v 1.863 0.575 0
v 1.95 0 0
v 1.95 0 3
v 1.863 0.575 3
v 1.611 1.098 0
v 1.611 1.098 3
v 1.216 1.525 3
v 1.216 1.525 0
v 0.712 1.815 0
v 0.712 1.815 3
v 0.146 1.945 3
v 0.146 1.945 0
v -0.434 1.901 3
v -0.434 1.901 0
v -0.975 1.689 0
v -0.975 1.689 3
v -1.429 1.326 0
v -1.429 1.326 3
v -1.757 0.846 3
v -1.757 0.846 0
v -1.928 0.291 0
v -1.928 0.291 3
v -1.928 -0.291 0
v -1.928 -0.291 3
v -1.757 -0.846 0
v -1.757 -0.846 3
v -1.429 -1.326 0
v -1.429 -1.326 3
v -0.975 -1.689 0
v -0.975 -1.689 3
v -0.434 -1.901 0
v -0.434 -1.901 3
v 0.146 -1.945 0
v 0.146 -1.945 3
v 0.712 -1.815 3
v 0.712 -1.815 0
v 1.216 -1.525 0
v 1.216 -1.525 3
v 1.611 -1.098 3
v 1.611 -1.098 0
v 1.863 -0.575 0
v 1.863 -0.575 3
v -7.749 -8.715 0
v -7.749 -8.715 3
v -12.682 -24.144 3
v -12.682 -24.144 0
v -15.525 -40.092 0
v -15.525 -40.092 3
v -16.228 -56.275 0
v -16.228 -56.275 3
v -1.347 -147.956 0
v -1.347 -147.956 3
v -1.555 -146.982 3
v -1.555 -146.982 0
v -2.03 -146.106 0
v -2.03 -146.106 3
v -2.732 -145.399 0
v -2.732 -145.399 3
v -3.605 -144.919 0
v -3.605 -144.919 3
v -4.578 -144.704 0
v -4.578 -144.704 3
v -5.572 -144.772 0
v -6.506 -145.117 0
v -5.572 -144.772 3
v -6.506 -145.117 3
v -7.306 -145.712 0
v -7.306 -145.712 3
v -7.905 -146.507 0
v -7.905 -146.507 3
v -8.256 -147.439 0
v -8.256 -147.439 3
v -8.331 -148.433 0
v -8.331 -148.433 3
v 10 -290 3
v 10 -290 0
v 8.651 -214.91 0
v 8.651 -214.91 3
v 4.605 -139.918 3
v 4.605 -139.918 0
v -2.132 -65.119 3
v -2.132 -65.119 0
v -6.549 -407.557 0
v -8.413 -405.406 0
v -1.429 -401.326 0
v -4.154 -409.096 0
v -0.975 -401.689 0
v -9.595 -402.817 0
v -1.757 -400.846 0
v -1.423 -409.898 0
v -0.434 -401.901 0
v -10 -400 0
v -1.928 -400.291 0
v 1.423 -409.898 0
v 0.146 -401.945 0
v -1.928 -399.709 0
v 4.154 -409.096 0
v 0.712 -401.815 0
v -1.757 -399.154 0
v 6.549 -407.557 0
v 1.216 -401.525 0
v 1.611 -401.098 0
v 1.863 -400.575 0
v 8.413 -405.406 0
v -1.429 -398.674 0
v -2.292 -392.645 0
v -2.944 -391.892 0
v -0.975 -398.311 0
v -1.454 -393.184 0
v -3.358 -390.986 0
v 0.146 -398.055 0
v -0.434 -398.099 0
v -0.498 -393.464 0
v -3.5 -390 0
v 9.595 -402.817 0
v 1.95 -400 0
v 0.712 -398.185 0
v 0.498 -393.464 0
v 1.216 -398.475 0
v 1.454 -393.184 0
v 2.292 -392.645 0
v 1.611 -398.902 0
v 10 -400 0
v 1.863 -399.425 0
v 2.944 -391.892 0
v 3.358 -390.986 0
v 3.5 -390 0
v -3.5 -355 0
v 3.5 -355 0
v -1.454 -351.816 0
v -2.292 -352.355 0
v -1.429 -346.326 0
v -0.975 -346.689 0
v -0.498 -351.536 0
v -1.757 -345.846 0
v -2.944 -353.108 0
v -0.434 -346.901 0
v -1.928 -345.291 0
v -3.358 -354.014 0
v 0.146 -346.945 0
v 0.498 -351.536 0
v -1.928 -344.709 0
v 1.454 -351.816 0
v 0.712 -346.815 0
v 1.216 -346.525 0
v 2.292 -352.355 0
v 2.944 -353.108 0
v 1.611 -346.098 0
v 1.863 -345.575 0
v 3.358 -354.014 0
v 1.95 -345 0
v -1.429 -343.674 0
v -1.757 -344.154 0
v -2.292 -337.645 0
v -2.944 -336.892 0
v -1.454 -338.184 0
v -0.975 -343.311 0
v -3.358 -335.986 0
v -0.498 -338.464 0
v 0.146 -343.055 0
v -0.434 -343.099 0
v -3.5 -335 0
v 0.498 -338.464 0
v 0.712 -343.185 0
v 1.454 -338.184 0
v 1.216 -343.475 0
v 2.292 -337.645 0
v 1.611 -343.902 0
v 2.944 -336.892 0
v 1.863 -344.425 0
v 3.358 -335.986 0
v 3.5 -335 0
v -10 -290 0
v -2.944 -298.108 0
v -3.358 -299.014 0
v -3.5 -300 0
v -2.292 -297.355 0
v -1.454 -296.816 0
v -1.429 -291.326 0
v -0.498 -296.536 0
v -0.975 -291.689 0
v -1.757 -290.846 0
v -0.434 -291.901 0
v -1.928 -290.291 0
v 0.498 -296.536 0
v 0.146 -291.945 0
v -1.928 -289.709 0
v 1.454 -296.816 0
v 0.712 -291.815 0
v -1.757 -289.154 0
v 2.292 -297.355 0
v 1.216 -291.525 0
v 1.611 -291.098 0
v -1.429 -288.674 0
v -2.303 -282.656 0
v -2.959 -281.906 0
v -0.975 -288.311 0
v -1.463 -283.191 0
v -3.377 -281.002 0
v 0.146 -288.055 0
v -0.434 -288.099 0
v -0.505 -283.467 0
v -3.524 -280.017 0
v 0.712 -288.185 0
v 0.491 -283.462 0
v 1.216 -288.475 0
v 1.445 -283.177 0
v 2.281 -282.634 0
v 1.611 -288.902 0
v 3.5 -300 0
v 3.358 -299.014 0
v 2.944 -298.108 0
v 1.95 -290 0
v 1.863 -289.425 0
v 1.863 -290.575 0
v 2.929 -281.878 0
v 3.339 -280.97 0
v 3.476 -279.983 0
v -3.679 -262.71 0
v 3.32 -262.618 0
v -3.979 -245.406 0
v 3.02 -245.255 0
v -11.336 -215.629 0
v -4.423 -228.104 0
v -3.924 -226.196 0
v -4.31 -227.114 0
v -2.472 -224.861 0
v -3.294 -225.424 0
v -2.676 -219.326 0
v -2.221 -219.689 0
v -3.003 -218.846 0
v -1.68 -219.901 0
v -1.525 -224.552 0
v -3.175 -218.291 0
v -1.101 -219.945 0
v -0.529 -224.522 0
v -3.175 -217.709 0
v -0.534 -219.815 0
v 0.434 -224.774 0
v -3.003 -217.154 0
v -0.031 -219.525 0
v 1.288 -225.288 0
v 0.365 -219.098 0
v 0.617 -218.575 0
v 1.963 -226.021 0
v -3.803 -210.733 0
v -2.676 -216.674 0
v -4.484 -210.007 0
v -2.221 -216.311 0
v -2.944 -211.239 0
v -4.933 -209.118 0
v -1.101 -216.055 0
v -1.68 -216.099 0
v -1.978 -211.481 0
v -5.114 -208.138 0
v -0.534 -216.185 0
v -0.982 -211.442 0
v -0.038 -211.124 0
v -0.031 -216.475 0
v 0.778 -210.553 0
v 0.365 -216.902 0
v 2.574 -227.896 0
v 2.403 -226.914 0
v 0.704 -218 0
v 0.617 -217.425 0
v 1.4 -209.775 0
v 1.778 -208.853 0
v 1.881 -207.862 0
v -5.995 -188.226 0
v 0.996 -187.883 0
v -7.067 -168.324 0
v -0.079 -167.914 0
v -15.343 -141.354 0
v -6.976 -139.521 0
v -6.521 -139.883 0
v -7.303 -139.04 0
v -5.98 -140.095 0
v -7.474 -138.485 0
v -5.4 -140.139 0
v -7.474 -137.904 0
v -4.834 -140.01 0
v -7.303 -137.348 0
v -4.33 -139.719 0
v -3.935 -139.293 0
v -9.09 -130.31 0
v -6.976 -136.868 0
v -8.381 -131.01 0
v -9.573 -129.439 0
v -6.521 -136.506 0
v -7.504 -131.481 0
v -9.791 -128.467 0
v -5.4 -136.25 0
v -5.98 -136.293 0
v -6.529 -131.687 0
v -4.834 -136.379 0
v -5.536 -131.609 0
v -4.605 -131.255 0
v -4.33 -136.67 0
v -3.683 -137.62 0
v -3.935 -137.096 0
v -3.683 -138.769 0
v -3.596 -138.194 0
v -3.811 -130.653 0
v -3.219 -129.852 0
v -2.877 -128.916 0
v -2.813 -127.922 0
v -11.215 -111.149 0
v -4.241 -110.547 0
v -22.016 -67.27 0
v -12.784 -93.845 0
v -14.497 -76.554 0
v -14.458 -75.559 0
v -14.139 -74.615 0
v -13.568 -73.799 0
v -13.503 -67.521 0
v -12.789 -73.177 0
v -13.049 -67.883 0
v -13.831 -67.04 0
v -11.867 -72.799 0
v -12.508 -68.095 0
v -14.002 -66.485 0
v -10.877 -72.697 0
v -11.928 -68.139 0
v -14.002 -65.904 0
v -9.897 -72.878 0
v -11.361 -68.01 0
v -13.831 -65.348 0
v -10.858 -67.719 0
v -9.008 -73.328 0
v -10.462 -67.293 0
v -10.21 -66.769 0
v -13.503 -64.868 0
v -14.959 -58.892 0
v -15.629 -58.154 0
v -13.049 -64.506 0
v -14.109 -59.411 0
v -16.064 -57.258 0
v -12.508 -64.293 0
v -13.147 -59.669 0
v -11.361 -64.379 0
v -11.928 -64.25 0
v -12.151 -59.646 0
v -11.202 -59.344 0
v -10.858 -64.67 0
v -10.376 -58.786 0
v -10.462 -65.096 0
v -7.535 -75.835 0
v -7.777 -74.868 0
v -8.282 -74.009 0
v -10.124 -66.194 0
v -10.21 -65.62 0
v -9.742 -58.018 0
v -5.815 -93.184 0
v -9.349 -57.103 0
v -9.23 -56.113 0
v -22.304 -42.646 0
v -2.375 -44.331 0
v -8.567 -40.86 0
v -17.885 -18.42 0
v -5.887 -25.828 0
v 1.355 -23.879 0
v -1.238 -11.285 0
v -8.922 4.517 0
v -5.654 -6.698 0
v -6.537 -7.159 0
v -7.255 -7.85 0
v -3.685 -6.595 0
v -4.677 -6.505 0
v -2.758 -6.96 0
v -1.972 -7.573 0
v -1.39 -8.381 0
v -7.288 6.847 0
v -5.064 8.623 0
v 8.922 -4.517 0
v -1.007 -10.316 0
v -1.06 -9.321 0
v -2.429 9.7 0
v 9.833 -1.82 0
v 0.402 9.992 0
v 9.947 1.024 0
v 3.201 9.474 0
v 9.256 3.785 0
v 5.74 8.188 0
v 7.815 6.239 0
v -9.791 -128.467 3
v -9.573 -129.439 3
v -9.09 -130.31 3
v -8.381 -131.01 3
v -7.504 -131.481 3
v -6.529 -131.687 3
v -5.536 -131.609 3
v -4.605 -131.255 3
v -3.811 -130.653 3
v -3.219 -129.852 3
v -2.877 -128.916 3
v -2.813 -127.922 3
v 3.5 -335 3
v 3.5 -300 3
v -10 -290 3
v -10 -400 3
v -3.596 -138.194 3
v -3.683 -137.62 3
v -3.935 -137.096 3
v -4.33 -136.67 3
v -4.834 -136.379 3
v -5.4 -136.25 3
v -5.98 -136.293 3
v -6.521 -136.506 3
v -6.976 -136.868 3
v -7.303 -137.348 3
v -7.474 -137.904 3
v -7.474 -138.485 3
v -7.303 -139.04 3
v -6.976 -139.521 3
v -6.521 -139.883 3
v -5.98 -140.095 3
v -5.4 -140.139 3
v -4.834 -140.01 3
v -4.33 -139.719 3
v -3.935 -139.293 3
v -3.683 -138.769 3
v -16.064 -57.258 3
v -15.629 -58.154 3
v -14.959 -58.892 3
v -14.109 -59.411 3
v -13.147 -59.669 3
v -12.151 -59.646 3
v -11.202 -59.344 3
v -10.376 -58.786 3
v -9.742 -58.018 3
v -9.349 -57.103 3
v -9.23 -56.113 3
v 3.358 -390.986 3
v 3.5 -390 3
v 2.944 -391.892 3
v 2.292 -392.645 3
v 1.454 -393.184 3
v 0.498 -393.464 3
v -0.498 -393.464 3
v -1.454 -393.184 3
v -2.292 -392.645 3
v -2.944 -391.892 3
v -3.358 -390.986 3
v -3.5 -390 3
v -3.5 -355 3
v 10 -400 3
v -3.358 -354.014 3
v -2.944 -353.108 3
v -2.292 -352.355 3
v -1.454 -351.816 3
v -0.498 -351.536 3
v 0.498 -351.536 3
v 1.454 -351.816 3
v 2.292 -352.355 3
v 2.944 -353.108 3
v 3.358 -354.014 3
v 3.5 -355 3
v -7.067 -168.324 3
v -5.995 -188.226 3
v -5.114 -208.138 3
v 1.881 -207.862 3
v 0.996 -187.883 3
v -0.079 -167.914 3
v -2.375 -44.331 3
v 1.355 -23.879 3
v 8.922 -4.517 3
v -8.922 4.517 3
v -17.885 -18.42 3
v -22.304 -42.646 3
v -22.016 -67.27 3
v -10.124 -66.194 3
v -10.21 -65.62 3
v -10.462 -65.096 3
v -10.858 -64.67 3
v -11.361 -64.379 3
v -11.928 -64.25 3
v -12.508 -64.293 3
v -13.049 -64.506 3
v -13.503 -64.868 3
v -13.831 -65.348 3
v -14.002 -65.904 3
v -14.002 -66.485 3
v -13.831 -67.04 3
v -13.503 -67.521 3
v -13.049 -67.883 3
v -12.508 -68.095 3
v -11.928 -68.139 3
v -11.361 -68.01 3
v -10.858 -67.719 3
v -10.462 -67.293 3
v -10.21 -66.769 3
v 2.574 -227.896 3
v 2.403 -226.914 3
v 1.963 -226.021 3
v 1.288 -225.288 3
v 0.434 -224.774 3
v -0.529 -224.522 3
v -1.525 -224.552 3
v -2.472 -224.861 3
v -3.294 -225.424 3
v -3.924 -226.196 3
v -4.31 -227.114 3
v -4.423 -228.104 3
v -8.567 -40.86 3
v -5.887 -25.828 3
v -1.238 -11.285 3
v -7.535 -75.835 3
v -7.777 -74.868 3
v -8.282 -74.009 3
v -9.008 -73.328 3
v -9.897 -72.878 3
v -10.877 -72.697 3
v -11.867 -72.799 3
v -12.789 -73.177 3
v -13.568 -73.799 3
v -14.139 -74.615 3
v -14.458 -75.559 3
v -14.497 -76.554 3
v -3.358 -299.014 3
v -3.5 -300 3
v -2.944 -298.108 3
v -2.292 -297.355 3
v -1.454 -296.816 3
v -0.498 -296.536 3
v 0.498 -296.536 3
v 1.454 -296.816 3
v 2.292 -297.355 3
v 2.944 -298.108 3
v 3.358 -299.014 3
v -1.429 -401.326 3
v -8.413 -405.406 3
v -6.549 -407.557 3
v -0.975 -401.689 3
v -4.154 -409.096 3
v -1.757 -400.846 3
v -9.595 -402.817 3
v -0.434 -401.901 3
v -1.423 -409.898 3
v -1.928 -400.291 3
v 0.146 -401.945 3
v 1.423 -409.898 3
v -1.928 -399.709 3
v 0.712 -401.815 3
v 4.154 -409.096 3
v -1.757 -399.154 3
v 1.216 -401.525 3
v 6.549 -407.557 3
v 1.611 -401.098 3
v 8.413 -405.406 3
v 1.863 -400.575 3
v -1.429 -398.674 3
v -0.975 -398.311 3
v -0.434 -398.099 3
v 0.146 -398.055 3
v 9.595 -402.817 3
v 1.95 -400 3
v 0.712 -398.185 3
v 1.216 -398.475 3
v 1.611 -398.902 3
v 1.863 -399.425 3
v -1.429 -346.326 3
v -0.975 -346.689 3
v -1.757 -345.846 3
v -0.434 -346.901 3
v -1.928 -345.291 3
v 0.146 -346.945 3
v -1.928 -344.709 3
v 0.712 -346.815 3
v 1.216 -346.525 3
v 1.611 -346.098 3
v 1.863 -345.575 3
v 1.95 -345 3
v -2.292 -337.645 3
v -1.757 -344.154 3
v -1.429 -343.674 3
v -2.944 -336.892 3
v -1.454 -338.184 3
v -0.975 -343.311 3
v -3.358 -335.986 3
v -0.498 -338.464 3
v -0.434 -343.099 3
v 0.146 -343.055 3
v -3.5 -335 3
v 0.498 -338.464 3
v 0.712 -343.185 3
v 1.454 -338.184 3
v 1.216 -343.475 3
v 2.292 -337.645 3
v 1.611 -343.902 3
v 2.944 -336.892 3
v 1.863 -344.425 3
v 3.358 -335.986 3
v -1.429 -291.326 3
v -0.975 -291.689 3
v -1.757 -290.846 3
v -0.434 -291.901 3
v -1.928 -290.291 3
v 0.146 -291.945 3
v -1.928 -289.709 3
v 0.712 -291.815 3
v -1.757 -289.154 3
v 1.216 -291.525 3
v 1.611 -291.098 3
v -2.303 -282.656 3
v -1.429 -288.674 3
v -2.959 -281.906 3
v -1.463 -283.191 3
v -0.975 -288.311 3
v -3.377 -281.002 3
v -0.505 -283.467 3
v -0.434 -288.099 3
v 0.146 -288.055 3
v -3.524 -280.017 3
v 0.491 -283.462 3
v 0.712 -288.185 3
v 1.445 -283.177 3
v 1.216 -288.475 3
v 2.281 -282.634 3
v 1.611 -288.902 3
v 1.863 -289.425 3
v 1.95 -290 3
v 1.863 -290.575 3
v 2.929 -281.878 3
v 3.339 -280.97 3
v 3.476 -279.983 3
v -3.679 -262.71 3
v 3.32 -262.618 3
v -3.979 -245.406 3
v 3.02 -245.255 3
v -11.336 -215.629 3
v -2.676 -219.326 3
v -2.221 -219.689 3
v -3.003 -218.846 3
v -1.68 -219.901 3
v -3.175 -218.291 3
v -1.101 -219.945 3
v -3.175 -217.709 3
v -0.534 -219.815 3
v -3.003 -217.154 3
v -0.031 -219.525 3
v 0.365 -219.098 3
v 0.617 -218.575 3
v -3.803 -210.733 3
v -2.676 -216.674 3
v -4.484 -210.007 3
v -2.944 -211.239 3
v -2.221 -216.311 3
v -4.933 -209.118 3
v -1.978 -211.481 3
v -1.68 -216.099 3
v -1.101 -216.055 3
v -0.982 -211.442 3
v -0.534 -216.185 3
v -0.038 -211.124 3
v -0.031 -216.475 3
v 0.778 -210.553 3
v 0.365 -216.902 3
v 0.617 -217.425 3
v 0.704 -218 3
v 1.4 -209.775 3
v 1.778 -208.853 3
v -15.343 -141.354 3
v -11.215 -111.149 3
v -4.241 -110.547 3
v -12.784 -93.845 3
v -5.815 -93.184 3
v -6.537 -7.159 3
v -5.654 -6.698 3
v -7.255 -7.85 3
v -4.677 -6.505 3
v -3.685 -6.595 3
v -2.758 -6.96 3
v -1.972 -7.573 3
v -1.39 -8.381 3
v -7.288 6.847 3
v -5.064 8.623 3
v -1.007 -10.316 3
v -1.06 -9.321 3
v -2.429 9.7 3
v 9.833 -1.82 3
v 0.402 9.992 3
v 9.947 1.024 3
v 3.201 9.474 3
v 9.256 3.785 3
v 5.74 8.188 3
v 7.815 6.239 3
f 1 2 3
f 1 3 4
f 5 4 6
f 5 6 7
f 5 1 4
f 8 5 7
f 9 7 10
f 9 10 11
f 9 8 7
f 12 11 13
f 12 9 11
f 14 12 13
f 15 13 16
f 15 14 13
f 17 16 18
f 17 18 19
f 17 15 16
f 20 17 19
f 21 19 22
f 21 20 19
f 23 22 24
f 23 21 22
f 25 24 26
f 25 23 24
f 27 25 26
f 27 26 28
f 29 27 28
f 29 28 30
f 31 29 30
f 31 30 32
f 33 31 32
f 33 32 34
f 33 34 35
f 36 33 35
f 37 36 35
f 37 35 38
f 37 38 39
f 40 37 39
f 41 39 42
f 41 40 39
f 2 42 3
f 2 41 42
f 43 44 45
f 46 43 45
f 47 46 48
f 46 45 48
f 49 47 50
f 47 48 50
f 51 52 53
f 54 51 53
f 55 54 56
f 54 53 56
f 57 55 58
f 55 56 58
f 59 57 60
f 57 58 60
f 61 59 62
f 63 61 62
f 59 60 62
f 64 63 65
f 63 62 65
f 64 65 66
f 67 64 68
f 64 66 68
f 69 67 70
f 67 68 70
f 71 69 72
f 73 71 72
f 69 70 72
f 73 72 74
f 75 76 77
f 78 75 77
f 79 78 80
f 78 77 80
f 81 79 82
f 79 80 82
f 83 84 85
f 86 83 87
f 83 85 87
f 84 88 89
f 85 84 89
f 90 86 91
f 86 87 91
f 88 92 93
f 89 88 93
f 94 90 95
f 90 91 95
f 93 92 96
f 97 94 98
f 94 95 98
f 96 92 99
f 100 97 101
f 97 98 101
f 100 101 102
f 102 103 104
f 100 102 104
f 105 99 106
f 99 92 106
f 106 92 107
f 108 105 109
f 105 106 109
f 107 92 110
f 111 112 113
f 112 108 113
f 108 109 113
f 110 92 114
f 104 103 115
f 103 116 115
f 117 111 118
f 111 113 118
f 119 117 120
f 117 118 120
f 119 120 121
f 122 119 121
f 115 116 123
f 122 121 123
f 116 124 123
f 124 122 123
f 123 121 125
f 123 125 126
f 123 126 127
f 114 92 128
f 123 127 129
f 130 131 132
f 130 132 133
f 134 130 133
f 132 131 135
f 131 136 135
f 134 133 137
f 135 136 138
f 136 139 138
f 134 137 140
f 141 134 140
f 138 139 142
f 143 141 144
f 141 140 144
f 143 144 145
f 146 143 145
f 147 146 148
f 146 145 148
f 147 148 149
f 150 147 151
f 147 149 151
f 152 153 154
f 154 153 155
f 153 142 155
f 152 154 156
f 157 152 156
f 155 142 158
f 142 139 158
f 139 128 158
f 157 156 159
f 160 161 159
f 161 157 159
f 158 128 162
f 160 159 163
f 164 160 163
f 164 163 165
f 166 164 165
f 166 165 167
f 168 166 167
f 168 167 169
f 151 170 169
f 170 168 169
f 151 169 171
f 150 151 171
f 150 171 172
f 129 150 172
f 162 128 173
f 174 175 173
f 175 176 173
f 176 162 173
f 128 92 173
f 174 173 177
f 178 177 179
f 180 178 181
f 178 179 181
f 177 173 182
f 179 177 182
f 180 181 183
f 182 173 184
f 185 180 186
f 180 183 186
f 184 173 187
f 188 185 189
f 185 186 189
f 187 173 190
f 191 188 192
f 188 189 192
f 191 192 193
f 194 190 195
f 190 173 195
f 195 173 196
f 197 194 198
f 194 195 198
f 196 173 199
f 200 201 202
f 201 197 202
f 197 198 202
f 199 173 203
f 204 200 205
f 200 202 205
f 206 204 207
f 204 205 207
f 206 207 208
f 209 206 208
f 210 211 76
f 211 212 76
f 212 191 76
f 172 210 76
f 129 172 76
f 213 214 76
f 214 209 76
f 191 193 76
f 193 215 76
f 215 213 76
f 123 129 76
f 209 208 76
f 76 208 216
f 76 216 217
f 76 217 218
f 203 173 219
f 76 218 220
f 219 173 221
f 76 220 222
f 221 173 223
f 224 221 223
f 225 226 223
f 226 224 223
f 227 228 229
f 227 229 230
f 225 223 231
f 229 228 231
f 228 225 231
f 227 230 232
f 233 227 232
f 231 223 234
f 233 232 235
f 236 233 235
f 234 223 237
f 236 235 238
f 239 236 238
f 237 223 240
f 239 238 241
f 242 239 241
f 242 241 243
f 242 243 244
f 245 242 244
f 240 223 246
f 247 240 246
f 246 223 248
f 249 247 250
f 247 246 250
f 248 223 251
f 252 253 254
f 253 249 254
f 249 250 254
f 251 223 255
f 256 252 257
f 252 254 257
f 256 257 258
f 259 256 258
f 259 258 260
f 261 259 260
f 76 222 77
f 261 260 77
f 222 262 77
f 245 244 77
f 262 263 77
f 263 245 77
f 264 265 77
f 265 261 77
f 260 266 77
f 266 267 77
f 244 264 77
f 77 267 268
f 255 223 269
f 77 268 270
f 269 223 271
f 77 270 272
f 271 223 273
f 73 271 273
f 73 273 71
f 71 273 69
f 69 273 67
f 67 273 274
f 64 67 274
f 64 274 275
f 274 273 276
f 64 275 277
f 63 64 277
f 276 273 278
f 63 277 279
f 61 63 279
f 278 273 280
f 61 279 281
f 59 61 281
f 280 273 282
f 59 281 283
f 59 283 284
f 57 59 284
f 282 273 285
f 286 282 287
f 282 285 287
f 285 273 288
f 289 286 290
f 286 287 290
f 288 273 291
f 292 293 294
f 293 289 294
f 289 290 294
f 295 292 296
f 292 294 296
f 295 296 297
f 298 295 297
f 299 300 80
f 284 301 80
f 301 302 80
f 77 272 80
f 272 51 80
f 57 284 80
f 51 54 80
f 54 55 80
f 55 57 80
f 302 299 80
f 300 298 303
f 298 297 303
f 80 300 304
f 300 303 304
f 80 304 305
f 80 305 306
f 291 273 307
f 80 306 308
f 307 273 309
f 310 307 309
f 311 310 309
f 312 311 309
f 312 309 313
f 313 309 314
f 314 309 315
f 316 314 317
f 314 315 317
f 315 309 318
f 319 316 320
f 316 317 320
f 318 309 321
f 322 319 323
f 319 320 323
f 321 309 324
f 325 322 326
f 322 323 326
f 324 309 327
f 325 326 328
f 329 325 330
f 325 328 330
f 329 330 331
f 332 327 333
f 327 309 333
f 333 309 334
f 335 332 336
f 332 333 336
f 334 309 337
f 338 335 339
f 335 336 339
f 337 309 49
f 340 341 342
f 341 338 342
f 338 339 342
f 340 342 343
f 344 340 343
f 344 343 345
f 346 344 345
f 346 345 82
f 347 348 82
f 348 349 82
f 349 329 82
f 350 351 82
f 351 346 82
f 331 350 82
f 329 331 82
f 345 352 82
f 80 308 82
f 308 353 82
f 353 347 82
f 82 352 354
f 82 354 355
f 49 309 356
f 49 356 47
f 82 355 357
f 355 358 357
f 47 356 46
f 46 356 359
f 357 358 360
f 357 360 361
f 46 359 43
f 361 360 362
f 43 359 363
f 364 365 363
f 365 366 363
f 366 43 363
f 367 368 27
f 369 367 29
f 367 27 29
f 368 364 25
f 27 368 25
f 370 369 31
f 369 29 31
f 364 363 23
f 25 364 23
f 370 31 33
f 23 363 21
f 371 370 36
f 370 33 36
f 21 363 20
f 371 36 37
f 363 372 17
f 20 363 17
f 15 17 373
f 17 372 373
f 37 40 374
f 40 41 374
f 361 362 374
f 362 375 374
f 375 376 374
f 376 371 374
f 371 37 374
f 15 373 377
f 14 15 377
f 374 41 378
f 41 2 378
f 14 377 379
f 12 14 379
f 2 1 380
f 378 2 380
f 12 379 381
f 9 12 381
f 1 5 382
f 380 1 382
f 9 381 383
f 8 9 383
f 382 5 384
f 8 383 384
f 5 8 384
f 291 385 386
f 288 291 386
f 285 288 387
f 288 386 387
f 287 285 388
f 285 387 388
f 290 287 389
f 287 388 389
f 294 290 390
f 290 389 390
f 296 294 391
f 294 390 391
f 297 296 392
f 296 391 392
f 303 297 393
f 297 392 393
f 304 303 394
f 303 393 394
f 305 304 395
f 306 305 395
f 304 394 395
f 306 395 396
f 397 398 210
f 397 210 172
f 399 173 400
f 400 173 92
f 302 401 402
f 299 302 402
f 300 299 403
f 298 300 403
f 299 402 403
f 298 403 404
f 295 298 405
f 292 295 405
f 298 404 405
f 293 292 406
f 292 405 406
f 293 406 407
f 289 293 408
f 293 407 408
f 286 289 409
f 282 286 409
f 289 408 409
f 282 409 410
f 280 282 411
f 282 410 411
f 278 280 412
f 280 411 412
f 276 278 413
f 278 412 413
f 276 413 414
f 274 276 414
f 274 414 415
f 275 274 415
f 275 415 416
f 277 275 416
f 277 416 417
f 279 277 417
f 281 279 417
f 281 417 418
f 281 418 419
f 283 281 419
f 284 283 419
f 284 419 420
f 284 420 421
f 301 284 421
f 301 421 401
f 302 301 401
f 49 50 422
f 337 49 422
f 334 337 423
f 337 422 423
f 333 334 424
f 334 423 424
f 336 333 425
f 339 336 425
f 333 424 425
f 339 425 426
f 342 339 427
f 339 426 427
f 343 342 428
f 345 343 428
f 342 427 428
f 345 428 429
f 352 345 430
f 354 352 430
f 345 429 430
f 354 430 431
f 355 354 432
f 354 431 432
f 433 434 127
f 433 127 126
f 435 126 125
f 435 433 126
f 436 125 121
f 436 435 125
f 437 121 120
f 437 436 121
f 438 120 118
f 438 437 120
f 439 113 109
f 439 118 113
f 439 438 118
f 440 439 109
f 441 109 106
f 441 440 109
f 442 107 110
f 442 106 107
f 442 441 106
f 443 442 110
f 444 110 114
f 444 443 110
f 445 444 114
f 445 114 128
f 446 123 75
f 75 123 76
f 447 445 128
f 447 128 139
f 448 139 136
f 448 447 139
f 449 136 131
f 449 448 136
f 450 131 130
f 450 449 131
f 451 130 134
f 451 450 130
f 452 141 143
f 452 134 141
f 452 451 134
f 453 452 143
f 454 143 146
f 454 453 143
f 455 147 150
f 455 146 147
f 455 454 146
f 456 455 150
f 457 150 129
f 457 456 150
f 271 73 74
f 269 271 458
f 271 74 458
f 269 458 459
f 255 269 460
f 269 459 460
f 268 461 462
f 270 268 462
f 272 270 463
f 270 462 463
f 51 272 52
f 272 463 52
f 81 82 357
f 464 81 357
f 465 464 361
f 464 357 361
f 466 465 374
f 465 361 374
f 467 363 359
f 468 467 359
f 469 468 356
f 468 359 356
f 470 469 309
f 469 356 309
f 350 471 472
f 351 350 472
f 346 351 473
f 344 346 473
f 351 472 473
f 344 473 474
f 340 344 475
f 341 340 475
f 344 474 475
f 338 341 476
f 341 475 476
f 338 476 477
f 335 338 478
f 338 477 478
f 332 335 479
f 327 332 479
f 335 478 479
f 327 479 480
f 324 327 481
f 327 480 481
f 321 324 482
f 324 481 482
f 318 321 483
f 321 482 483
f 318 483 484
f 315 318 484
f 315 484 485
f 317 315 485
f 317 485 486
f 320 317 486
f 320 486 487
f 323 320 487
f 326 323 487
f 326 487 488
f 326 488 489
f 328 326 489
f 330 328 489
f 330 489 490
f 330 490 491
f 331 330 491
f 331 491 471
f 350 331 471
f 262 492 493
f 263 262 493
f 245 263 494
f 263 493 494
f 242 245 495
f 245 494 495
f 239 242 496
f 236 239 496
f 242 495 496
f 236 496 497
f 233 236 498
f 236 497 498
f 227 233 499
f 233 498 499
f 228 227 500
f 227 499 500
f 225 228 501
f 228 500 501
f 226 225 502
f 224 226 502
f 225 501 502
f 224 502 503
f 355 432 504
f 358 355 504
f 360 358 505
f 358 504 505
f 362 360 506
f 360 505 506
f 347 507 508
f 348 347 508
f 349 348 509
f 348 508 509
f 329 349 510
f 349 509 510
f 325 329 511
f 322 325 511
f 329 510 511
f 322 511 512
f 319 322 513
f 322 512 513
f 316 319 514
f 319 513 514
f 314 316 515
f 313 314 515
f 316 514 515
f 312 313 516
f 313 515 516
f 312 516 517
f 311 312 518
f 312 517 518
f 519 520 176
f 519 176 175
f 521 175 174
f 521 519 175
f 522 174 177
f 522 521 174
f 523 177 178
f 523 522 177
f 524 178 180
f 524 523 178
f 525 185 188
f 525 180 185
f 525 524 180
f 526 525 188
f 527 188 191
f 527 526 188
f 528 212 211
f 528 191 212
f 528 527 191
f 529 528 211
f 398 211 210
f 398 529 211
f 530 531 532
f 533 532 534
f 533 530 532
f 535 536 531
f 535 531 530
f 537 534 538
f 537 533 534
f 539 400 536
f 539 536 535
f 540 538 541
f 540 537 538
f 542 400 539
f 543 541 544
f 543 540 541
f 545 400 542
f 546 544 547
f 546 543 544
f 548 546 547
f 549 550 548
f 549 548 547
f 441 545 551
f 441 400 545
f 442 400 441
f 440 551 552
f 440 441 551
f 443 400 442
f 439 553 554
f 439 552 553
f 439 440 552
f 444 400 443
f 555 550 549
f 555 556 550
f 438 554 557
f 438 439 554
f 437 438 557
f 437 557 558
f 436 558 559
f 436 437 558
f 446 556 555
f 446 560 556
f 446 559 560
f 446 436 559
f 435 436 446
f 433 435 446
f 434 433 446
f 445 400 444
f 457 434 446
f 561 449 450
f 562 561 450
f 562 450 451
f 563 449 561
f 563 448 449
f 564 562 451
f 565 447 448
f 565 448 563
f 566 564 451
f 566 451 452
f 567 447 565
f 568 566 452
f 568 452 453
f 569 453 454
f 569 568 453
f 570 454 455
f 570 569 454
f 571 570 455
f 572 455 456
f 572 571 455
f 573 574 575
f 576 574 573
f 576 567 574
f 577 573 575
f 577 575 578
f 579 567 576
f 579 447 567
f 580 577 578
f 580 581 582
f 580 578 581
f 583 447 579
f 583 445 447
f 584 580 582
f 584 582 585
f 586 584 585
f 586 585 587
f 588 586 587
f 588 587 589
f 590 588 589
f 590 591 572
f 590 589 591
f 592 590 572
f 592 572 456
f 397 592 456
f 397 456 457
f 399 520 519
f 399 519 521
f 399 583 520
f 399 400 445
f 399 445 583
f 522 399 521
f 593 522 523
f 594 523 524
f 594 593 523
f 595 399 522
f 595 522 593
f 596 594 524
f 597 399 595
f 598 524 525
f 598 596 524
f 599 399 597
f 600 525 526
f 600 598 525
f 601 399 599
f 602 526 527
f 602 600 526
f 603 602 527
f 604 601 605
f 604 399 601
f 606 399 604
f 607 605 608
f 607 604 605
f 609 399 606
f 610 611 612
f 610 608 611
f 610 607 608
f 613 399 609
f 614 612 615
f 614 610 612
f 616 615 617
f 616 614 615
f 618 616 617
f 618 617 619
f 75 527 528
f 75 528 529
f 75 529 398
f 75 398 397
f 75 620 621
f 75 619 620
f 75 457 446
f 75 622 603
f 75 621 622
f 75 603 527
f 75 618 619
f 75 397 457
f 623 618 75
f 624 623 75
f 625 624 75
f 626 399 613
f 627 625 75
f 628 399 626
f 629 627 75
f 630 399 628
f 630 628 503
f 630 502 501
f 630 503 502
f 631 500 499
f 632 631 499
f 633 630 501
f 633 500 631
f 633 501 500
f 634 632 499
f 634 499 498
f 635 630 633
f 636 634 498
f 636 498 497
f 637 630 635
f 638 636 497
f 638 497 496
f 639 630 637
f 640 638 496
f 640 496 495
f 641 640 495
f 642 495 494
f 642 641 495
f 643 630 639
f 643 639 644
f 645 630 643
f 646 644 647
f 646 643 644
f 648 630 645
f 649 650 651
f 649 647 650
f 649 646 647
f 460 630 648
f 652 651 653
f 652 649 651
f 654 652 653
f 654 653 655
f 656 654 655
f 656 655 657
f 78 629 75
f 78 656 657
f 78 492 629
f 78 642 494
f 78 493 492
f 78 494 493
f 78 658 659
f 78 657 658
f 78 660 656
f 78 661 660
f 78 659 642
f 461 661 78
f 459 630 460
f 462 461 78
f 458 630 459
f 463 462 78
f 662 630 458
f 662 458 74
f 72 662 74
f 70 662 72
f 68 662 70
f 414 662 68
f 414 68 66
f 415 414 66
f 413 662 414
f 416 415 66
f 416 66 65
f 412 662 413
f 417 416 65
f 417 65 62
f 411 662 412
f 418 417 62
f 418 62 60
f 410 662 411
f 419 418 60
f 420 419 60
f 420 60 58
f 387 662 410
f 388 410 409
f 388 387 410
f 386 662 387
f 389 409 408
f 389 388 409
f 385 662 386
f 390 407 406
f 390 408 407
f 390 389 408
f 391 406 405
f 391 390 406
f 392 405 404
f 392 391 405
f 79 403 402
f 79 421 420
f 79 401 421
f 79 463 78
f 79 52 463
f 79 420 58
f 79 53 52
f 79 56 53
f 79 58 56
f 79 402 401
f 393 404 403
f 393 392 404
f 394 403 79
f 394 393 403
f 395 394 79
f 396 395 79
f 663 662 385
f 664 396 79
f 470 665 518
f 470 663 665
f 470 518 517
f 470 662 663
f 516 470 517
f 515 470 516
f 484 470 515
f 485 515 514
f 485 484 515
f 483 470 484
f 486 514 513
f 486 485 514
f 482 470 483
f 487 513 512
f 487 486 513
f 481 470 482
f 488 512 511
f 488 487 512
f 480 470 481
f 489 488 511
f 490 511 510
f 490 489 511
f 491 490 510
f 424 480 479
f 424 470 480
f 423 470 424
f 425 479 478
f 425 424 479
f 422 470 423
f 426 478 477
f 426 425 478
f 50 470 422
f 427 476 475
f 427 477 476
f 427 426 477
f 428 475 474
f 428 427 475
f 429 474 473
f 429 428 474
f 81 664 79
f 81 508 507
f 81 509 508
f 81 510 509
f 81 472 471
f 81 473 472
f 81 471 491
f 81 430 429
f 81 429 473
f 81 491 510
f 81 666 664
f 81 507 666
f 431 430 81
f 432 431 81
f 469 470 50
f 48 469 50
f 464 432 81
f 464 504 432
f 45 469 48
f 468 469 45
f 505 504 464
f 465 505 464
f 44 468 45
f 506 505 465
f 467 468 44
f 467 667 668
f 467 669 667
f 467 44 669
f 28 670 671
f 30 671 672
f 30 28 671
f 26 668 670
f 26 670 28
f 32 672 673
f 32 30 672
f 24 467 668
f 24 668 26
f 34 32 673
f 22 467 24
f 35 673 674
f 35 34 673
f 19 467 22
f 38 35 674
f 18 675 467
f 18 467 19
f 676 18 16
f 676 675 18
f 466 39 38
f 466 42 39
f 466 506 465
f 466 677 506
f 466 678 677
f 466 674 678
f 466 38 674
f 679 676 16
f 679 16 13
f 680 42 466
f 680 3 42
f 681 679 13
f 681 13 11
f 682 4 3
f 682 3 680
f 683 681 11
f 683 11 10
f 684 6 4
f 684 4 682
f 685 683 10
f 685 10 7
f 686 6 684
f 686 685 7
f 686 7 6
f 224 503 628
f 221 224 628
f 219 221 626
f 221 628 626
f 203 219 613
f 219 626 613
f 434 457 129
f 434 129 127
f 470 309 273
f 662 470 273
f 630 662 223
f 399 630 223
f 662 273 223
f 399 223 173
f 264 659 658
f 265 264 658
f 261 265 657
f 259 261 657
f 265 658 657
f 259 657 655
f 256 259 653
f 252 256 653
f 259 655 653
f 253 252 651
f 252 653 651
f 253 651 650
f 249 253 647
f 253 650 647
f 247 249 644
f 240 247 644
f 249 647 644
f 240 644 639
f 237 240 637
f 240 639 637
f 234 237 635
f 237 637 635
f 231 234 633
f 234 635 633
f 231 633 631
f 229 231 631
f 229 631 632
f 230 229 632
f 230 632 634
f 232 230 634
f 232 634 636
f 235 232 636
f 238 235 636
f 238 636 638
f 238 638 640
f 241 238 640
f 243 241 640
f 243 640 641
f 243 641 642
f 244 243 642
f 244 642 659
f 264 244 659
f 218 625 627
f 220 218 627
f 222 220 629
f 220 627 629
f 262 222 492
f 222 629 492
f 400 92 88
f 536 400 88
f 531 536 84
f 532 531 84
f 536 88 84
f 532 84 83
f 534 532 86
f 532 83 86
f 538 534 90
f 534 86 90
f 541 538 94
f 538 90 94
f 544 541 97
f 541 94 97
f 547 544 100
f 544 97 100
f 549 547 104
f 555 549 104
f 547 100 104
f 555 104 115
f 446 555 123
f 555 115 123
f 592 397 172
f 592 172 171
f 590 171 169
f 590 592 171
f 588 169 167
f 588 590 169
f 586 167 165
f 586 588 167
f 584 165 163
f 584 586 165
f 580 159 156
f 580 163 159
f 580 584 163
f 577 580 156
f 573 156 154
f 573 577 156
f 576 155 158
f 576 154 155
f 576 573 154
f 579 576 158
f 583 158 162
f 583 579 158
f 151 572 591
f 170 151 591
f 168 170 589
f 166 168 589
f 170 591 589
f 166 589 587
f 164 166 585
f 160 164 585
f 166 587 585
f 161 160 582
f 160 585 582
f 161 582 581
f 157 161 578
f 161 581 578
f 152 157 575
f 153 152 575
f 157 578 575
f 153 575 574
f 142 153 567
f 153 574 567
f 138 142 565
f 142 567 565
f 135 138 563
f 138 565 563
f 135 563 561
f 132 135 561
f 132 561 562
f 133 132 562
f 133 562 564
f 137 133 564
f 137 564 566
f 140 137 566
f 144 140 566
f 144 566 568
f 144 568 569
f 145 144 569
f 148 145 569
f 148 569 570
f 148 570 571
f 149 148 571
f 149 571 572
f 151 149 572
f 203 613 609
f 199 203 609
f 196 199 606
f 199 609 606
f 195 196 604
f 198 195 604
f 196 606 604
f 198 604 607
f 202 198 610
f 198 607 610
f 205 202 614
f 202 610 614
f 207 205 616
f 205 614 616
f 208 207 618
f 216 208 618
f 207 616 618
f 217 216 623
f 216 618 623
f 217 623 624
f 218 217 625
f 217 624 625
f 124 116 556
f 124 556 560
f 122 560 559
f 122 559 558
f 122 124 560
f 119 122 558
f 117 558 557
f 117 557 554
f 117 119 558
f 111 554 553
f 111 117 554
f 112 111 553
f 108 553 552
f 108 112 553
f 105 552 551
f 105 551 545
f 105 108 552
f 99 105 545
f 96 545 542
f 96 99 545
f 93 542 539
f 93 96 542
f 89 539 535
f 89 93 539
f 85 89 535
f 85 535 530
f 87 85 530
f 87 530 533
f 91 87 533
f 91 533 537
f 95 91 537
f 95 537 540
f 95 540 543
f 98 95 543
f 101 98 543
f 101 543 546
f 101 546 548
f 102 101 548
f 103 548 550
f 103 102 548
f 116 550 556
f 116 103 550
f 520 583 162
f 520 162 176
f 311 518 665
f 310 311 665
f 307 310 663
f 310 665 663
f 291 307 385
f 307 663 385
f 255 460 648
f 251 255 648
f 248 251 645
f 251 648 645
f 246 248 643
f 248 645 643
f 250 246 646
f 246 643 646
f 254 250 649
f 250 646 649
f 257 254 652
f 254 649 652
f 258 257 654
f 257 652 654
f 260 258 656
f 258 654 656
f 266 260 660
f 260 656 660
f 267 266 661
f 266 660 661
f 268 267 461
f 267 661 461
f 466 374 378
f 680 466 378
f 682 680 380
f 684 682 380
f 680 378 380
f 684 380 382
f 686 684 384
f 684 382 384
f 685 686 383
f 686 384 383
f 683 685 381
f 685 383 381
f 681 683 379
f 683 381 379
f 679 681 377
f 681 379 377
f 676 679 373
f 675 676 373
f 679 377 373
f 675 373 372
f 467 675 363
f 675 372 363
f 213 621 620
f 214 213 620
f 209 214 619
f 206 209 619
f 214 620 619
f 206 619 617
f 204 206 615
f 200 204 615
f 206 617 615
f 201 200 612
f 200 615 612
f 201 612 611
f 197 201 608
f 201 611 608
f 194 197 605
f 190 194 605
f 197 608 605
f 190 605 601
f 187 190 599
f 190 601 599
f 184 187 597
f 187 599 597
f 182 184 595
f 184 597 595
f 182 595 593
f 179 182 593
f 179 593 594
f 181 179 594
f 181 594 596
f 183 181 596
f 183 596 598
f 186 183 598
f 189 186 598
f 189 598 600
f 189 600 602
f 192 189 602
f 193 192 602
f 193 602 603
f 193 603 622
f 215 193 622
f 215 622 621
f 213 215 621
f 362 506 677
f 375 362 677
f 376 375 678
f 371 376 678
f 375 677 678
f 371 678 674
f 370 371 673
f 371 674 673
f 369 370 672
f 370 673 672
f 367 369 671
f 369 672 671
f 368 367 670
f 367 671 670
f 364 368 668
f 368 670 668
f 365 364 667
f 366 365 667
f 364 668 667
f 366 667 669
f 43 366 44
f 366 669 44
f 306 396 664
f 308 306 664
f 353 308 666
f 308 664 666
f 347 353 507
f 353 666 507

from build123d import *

# Parameters (mm, degrees)
SKETCH_1_R          = 1.95
EXTRUDE_2_DEPTH     = 3
SKETCH_3_R          = 1.95
CUT_EXTRUDE_1_DEPTH = 411.642233029
CUT_EXTRUDE_2_DEPTH = 411.642233029


with BuildPart() as part:
    # 草图1 → 凸台-拉伸2 (new body)
    with BuildSketch(Plane.XY):
        with BuildLine():
            Line((-10, -290), (-10, -400))
            ThreePointArc((-10, -400), (0, -410), (10, -400))
            Line((10, -400), (10, -290))
            ThreePointArc((10, -290), (6.964883906, -177.395762041), (-2.13165062, -65.118518595))
            ThreePointArc((-2.13165062, -65.118518595), (-1.001742213, -34.015540789), (8.921943266, -4.516517282))
            ThreePointArc((8.921943266, -4.516517282), (4.516517282, 8.921943266), (-8.921943266, 4.516517282))
            ThreePointArc((-8.921943266, 4.516517282), (-20.677134638, -30.426817765), (-22.015577858, -67.27013138))
            ThreePointArc((-22.015577858, -67.27013138), (-13.006076822, -178.473132736), (-10, -290))
        make_face()
        Circle(SKETCH_1_R, mode=Mode.SUBTRACT)
        with Locations((0, -400)):
            Circle(SKETCH_1_R, mode=Mode.SUBTRACT)
    extrude(amount=EXTRUDE_2_DEPTH)

    # 草图3 → 切除-拉伸1 (cut, through all)
    with BuildSketch(Plane.XY.offset(3)):
        with Locations((-12.073614239, -66.194324988)):
            Circle(SKETCH_3_R)
        with Locations((0, -290)):
            Circle(SKETCH_3_R)
        with Locations((0, -345)):
            Circle(SKETCH_3_R)
        with Locations((-5.546108146, -138.194324988)):
            Circle(SKETCH_3_R)
        with Locations((-1.246315893, -218)):
            Circle(SKETCH_3_R)
    extrude(amount=-CUT_EXTRUDE_1_DEPTH, mode=Mode.SUBTRACT)

    # 草图4 → 切除-拉伸2 (cut, through all)
    with BuildSketch(Plane.XY.offset(3)):
        with BuildLine():
            Line((3.5, -300), (3.5, -335))
            ThreePointArc((3.5, -335), (0, -338.5), (-3.5, -335))
            Line((-3.5, -335), (-3.5, -300))
            ThreePointArc((-3.5, -300), (0, -296.5), (3.5, -300))
        make_face()
        with BuildLine():
            Line((3.5, -355), (3.5, -390))
            ThreePointArc((3.5, -390), (0, -393.5), (-3.5, -390))
            Line((-3.5, -390), (-3.5, -355))
            ThreePointArc((-3.5, -355), (0, -351.5), (3.5, -355))
        make_face()
        with BuildLine():
            ThreePointArc((-7.748753127, -8.714910959), (-14.36874553, -32.070657967), (-16.228058971, -56.275165217))
            ThreePointArc((-16.228058971, -56.275165217), (-12.648152458, -59.693391271), (-9.229926404, -56.113484758))
            ThreePointArc((-9.229926404, -56.113484758), (-7.477411831, -33.29928315), (-1.237671449, -11.285089041))
            ThreePointArc((-1.237671449, -11.285089041), (-3.208123247, -6.744459161), (-7.748753127, -8.714910959))
        make_face()
        with BuildLine():
            ThreePointArc((-2.812608819, -127.922101985), (-5.01013796, -101.863544894), (-7.534506265, -75.83461682))
            ThreePointArc((-7.534506265, -75.83461682), (-11.375681082, -72.712858338), (-14.497439565, -76.554033155))
            ThreePointArc((-14.497439565, -76.554033155), (-11.981551023, -102.495525828), (-9.79140374, -128.46654799))
            ThreePointArc((-9.79140374, -128.46654799), (-6.029783277, -131.683722448), (-2.812608819, -127.922101985))
        make_face()
        with BuildLine():
            ThreePointArc((1.880579751, -207.862042625), (0.482482294, -177.897281403), (-1.346806184, -147.955750125))
            ThreePointArc((-1.346806184, -147.955750125), (-5.077240441, -144.702465593), (-8.330524974, -148.43289985))
            ThreePointArc((-8.330524974, -148.43289985), (-6.507381374, -178.273852657), (-5.113980353, -208.137957375))
            ThreePointArc((-5.113980353, -208.137957375), (-1.478742925, -211.497280052), (1.880579751, -207.862042625))
        make_face()
        with BuildLine():
            ThreePointArc((3.475925039, -279.98317593), (3.187918187, -253.936615897), (2.574358276, -227.895690765))
            ThreePointArc((2.574358276, -227.895690765), (-1.028396268, -224.501554691), (-4.422532343, -228.104309235))
            ThreePointArc((-4.422532343, -228.104309235), (-3.81103348, -254.057758666), (-3.523994089, -280.01682407))
            ThreePointArc((-3.523994089, -280.01682407), (-0.007210455, -283.499959564), (3.475925039, -279.98317593))
        make_face()
    extrude(amount=-CUT_EXTRUDE_2_DEPTH, mode=Mode.SUBTRACT)


solid = part.part
